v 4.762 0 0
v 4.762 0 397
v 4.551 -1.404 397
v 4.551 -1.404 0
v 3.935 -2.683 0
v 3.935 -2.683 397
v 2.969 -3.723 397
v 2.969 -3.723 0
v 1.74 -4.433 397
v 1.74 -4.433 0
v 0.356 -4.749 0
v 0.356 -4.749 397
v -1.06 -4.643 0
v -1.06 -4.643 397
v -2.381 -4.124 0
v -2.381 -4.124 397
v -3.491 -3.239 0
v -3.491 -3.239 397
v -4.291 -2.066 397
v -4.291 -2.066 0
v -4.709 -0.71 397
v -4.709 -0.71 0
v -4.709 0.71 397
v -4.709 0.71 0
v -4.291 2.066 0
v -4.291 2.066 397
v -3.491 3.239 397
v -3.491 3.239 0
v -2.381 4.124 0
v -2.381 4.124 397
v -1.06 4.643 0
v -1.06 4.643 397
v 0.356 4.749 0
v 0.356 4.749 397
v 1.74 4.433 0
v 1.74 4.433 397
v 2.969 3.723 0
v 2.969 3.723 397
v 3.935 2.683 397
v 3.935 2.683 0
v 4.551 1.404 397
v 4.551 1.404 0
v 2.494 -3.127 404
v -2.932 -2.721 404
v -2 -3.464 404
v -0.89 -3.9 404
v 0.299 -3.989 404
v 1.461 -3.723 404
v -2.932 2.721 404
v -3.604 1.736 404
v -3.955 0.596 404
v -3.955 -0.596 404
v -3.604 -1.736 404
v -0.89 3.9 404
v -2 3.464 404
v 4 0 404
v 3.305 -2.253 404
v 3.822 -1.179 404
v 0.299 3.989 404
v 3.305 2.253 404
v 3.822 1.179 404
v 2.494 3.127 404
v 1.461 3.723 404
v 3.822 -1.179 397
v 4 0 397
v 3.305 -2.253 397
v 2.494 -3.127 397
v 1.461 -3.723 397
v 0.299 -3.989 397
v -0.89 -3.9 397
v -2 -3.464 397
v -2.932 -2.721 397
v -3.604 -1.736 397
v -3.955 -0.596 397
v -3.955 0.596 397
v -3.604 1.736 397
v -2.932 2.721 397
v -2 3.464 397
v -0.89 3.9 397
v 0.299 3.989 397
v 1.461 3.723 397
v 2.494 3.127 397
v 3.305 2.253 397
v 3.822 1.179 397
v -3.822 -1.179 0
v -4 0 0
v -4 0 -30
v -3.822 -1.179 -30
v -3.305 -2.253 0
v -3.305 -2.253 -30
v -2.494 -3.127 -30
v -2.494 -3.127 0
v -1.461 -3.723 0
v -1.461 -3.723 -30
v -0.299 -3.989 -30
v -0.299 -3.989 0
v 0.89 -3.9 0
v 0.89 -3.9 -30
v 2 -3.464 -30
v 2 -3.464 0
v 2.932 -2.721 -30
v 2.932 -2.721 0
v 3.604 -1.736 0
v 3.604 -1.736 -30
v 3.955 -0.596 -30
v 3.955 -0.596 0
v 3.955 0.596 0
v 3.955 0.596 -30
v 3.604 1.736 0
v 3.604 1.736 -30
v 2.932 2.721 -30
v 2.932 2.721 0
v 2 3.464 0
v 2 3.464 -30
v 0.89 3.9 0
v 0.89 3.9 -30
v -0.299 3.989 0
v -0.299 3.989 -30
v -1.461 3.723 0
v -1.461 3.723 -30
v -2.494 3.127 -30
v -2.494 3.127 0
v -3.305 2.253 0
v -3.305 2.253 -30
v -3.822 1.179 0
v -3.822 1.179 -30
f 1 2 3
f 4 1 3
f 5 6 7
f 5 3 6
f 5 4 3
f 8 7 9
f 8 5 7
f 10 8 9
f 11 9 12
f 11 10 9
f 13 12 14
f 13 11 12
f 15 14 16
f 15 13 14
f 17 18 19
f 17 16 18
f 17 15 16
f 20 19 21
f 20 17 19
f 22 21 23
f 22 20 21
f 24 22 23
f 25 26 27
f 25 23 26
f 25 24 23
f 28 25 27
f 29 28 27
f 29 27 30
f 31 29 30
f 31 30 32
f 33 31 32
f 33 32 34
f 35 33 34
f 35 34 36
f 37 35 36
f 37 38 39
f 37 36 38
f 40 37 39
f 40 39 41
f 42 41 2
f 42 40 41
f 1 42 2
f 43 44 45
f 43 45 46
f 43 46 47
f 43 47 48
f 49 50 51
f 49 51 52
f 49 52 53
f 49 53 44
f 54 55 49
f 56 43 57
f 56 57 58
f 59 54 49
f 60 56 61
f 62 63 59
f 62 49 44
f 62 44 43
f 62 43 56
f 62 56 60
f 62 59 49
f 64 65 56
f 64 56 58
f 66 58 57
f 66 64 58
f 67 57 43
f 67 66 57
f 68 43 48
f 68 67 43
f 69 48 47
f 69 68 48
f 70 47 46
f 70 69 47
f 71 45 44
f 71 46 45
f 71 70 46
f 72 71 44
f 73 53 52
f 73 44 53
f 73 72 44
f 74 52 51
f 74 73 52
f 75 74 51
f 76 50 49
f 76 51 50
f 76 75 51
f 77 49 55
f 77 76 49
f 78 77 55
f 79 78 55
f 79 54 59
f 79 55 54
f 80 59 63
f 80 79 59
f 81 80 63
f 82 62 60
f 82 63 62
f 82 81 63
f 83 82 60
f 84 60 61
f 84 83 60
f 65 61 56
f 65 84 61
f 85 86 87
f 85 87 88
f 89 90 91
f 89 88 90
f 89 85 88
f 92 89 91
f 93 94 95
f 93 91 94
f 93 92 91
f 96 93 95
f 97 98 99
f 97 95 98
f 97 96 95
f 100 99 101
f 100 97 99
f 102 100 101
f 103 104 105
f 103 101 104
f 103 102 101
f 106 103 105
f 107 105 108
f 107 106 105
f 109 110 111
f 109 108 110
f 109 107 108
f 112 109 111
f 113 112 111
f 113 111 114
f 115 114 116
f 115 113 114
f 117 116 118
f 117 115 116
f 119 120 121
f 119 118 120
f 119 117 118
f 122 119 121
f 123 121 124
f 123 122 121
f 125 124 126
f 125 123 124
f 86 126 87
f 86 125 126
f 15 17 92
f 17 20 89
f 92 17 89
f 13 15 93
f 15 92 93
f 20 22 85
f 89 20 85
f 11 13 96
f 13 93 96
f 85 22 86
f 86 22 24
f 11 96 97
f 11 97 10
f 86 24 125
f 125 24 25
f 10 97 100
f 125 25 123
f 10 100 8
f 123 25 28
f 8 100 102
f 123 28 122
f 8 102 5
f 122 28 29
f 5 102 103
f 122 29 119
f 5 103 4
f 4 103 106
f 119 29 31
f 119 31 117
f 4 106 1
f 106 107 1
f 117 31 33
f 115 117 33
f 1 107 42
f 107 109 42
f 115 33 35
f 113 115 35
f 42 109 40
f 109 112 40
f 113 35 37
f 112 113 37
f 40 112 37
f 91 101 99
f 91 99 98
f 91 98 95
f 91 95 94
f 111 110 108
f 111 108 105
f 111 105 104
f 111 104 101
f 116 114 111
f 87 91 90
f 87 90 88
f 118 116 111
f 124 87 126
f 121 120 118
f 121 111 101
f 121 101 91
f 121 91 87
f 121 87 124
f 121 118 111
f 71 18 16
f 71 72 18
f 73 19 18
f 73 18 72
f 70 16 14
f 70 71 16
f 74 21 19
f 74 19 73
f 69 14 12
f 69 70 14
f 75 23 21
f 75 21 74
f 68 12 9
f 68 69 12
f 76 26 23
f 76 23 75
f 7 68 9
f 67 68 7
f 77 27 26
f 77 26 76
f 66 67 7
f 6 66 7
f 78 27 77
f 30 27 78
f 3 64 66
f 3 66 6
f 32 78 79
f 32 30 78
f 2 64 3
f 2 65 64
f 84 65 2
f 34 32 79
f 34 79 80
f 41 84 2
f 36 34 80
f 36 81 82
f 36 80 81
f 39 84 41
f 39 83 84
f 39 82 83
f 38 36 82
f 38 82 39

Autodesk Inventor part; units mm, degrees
ref_plane "YZ Plane" through (0, 0, 0) normal (1, 0, 0) x (0, 1, 0)
ref_plane "XZ Plane" through (0, 0, 0) normal (0, 1, 0) x (-1, 0, 0)
ref_plane "XY Plane" through (0, 0, 0) normal (0, 0, 1) x (1, 0, 0)
sketch "Sketch1" plane through (0, 0, 0) normal (0, 0, 1) x (1, 0, 0)
  circle A0 centre (0, 0) radius 4.7625
  dimension "d0" = 9.525
extrude "Extrusion1" add sketch "Sketch1" along normal blind 397
sketch "Sketch2" plane through (0, 0, 397) normal (0, 0, 1) x (1, 0, 0)
  circle A0 centre (0, 0) radius 4.7625 projected
  circle A1 centre (0, 0) radius 4
  dimension "d3" = 8
extrude "Extrusion2" add sketch "Sketch2" along normal blind 7 contours A1
sketch "Sketch3" plane through (0, 0, 0) normal (0, 0, -1) x (-1, 0, 0)
  circle A0 centre (0, 0) radius 4.7625 projected
  circle A1 centre (0, 0) radius 4
  dimension "d6" = 8
extrude "Extrusion3" add sketch "Sketch3" along normal blind 30 contours A1
thread "Thread1" size "3/8-12" class "2B" standard "Inch Tapping Threads" full length
properties part number "x_acme_upgrade"
